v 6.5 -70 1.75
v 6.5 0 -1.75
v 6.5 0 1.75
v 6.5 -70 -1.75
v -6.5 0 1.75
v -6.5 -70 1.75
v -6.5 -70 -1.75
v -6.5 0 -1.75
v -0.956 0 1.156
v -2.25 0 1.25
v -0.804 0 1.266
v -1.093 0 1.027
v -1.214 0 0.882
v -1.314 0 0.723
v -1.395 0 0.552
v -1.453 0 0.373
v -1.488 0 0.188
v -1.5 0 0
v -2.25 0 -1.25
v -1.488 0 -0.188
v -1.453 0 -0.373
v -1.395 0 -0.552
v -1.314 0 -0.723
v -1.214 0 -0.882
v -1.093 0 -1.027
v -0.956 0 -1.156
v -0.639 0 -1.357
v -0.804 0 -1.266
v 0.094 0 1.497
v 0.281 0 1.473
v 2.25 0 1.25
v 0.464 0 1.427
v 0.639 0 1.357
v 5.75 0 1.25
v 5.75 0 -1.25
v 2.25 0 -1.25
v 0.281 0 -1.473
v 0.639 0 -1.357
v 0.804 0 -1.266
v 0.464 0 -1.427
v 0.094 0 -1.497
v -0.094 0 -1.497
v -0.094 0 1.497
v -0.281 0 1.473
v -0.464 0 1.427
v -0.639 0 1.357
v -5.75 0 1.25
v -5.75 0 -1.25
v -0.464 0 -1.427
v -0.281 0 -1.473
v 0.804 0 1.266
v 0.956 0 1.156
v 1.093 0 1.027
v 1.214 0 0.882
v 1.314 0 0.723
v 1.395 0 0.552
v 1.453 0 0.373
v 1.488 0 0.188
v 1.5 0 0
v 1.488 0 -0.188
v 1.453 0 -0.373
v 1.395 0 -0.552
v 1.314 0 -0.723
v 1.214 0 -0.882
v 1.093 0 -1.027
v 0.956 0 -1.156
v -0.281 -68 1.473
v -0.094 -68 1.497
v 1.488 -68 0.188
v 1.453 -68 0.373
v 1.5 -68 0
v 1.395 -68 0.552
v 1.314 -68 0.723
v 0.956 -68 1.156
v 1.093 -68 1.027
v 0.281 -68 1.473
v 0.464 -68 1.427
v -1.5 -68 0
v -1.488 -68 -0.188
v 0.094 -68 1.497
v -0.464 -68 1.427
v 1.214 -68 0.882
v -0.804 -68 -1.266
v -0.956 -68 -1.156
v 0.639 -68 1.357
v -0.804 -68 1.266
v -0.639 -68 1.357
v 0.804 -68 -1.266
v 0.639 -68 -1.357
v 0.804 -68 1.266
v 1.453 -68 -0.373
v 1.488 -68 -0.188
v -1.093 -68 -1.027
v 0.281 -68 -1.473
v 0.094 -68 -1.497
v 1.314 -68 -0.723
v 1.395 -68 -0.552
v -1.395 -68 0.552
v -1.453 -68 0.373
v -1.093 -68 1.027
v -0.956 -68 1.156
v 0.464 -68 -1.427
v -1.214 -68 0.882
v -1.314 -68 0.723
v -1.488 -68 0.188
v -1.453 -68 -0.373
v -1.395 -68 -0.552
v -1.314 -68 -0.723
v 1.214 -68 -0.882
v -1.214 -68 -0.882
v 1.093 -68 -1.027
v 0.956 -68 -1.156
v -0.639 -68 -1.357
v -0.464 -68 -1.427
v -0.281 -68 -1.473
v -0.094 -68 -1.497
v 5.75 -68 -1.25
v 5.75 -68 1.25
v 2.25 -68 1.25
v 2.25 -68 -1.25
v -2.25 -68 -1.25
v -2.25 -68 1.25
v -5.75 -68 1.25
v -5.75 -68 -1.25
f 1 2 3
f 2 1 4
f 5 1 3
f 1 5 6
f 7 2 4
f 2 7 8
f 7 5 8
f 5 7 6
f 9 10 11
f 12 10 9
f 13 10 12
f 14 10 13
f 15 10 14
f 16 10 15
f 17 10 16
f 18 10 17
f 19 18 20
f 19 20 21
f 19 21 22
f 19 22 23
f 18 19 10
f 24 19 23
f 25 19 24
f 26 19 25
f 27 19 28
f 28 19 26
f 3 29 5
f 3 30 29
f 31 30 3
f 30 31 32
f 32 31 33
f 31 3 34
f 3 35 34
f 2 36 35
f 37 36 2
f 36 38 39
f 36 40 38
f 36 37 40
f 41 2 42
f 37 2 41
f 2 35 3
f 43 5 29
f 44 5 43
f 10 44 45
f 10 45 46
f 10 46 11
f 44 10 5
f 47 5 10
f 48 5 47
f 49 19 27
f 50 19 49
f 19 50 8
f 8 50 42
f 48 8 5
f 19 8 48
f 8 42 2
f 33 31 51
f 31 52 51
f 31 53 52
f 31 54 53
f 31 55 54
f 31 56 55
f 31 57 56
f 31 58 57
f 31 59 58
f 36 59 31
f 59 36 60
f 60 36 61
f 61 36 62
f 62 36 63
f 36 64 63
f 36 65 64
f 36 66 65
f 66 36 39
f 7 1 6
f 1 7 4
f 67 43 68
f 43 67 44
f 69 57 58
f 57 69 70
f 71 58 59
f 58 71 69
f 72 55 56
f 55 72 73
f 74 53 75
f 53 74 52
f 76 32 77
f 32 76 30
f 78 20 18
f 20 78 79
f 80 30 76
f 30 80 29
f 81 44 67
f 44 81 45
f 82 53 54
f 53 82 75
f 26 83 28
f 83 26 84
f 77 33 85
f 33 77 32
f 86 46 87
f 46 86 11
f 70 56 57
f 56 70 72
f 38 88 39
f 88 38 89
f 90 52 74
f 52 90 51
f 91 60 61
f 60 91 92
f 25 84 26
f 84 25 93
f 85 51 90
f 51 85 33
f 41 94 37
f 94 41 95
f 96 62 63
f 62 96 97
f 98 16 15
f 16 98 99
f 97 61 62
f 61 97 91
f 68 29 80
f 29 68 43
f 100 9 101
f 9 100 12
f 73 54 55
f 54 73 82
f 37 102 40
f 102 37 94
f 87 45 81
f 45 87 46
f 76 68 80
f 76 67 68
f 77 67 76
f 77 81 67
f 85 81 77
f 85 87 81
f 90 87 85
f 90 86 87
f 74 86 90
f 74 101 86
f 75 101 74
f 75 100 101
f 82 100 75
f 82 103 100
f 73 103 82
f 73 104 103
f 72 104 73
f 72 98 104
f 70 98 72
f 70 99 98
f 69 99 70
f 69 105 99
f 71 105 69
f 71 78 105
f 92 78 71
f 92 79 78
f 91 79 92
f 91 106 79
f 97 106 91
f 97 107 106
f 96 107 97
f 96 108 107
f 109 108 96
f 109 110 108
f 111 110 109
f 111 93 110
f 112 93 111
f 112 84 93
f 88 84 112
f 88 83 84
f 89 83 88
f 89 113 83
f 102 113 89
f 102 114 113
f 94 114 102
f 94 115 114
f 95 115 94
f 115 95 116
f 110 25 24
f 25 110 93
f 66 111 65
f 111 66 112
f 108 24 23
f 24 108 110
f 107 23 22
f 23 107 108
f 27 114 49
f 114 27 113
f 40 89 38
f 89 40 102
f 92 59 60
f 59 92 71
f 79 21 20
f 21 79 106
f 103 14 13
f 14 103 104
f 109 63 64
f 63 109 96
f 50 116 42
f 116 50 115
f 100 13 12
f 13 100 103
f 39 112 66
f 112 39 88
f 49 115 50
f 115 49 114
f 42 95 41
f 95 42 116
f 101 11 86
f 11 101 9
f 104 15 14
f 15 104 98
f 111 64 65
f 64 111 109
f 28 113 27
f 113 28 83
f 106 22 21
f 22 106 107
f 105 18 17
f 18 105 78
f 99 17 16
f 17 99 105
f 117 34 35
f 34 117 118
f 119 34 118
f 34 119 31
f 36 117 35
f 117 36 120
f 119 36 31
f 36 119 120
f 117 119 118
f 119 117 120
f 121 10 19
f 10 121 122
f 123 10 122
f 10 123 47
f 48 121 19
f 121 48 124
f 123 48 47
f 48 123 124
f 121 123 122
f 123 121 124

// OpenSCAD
WIDTH = 13;
LENGTH = 70;
THICKNESS = 3.5;

PEN_DIA = 3;
PEN_LENGTH = 68;

TOOTHPICK_WIDTH = 3.5;
TOOTHPICK_THICKNESS = 2.5;
TOOTHPICK_LENGTH = PEN_LENGTH;
TOOTHPICK_OFFSET = 4;

TWEEZERS_WIDTH = 3.5;
TWEEZERS_THICKNESS = 2.5;
TWEEZERS_LENGTH = PEN_LENGTH;
TWEEZERS_OFFSET = -4;

$fn = 50;

module holder() {
  difference() {
    translate([-WIDTH/2, -LENGTH, -THICKNESS/2])
    cube(size = [WIDTH, LENGTH, THICKNESS]);

    #rotate([90, 0, 0])
    cylinder(d = PEN_DIA, h = PEN_LENGTH);

    #translate([-TOOTHPICK_WIDTH/2 + TOOTHPICK_OFFSET, -TOOTHPICK_LENGTH, -TOOTHPICK_THICKNESS/2])
    cube(size = [TOOTHPICK_WIDTH, TOOTHPICK_LENGTH, TOOTHPICK_THICKNESS]);

    #translate([-TWEEZERS_WIDTH/2 + TWEEZERS_OFFSET, -TWEEZERS_LENGTH, -TWEEZERS_THICKNESS/2])
    cube(size = [TWEEZERS_WIDTH, TWEEZERS_LENGTH, TWEEZERS_THICKNESS]);
  }
}

holder();
